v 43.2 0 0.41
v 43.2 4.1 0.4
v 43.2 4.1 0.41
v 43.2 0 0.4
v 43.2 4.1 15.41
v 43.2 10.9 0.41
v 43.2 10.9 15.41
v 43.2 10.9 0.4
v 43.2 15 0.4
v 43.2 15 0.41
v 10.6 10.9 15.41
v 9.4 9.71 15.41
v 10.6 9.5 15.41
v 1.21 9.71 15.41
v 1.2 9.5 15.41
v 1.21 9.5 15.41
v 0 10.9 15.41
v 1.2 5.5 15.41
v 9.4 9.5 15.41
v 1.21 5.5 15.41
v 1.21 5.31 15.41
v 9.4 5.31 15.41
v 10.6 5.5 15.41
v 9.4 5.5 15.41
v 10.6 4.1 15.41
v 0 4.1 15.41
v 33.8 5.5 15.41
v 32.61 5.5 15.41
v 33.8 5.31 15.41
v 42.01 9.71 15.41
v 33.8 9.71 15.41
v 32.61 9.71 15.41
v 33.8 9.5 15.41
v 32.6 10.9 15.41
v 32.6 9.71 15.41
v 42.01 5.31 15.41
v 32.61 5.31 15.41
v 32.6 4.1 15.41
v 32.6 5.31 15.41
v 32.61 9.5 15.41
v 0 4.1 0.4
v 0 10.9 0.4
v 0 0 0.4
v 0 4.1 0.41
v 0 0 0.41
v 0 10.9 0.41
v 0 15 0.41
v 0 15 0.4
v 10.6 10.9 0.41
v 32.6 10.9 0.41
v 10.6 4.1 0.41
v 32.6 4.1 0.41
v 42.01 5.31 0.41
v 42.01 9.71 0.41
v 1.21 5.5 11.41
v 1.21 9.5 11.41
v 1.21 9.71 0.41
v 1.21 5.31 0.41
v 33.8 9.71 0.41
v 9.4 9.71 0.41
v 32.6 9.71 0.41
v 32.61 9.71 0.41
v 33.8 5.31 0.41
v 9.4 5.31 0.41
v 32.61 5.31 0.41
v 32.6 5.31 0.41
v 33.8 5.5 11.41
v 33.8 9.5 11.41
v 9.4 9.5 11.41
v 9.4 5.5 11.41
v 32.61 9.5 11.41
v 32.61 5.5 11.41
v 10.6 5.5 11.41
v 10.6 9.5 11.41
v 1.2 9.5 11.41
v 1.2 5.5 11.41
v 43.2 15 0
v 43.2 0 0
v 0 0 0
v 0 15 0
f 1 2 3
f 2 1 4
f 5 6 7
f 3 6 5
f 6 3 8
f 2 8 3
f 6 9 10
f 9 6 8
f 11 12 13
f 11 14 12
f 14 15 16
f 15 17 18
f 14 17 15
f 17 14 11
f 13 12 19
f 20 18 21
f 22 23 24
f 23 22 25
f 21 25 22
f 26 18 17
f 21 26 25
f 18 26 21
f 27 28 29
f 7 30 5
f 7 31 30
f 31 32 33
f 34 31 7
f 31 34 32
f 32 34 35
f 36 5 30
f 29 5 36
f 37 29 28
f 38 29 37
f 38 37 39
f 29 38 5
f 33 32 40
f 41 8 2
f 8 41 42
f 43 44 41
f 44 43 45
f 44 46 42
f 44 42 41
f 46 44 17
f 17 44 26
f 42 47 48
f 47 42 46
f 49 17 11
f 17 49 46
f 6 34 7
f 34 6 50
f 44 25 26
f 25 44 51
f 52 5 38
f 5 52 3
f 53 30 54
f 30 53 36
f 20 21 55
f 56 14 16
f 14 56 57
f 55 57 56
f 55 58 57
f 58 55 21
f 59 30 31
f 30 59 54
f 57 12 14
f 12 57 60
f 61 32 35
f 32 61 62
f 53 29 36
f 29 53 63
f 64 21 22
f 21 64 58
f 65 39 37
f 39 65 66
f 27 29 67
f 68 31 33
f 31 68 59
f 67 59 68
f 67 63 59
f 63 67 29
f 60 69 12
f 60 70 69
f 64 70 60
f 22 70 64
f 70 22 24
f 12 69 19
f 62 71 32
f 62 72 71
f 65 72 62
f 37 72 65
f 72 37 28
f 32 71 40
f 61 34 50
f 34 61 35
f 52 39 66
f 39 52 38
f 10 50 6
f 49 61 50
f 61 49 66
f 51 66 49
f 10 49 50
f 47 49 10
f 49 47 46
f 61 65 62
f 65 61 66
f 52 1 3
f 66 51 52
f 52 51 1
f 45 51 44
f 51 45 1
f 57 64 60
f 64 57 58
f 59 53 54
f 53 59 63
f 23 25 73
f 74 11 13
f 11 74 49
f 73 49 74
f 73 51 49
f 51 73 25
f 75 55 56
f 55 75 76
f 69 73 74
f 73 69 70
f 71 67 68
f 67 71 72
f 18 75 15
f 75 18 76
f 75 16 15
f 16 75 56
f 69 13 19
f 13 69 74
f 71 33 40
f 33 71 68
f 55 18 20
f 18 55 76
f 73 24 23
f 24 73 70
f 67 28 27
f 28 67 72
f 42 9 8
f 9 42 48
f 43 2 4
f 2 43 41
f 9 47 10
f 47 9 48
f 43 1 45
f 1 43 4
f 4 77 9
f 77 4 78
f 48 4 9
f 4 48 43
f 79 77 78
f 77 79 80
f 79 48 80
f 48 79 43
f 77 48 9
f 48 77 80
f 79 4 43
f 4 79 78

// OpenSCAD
// file: ../../Base/PlacementOptions.scad
// Fischertechnik Box Foundation
// Placement Options

// Alignment
NoAlign = 0;
AlignLeft = 1;
AlignBottom = 2;
AlignCenter = 3;
AlignRight = 4;
AlignTop = 5;

// Element rotation degree steps
rotations = [0, -90, -180, -270];

// Rotation
NoRotation = 0;
Rotate0 = 0;
Rotate90 = 1;
Rotate180 = 2;
Rotate270 = 3;

// Docking (seen from above)
NoDock = -1;
DockLeft = 0;
DockTop = 1;
DockRight = 2;
DockCorner = 2;
DockBottom = 3;

// Web corners
LowerLeft = 0;
UpperLeft = 1;
UpperRight = 2;
LowerRight = 3;

// Web position relative to corner
LeftOfCorner = 0;
RightOfCorner = 1;
// file: ../../Base/Boxes.scad
// Fischertechnik Box Foundation
// Pre-designed Boxes

use <Constants.scad>

include <PlacementOptions.scad>

box190Width = 190;
box190Depth = 130;
box130Width = 130;
box130Depth = 95;

// Values are from an original ec3 box
topBottomDifference = 1.5;
outerHeight = 40;
baseThickness = 1.8;
innerHeight = outerHeight - baseThickness;
stackExcess = 5.7;
radius = 3.5;
wallThickness = 1.5;
tolerance = 0.2;

boxWallThickness = wallThickness;
boxBaseThickness = baseThickness;
boxWebWidth = 3.0;

// getBoxWallThickness()
// Gets the wall thickness of a Fischertechnik Box
function getBoxWallThickness() = boxWallThickness;

// getBoxUsageHeight(height = 38.2)
// Gets the usable height of a Fischertechnik box
// height = Outer height of the box from the bottom to the upper edge.
function getBoxUsageHeight(height = outerHeight) = height - baseThickness - stackExcess;

// getBoxInnerHeight()
// Gets the inner height of a Fischertechnik box, including the stack excess
function getBoxInnerHeight() = innerHeight;

// getBoxBaseThickness()
// Gets the thickness of the Fischertechnik box base.
function getBoxBaseThickness() = boxBaseThickness;

// getBoxWebWidth()
// Gets the width of a box web
function getBoxWebWidth() = boxWebWidth;

// getBox190Space()
// Gets the usable inner space of a Box 190 as an x/y-list
function getBox190Space() = [
    box190Width - 2*getBoxWallThickness() - topBottomDifference, 
    box190Depth - 2*getBoxWallThickness() - topBottomDifference ];

// RoundedCornerPlate(width, depth, height, radius)
// Creates a body plate with rounded corners for a box. Used
// also to create the complete box with the hull module.
// width = Width of the plate
// depth = depth of the plate 
// height = thickness of the plate
// radius = radius of the rounded corner
module RoundedCornerPlate(width, depth, height, radius) {
    translate([radius, radius])
    hull() {
        w = width-2*radius;
        d = depth-2*radius;
        cube([w, d, height]);
        cylinder(height, r=radius, $fn=getFragments());
        translate([w, 0])
            cylinder(height, r=radius, $fn=getFragments());
        translate([w, d])
            cylinder(height, r=radius, $fn=getFragments());
        translate([0, d])
            cylinder(height, r=radius, $fn=getFragments());
    }
}

// BoxBase(width, depth)
// Creates an empty stackable Fischertechnik compatible box
// width = Outer width of the box (190, 130, ...)
// depth = Outer depth of the box (130, 95, ...)

module BoxBase(width, depth, height=outerHeight) {    
    thinPlate = 0.01;

    innerHeight = height - baseThickness;    
    
    module Body(tolerance=tolerance) {
        hull() {
            // Bottom with tolerance to fit into the original boxes when stacked
            translate([-wallThickness+tolerance, -wallThickness+tolerance, -baseThickness])
                RoundedCornerPlate(width-topBottomDifference-2*tolerance, depth-topBottomDifference-2*tolerance, thinPlate, radius);
            
            // Top
            translate([-wallThickness-topBottomDifference/2, -wallThickness-topBottomDifference/2, innerHeight-thinPlate])
                RoundedCornerPlate(width, depth, thinPlate, radius);
         }
    }

    module Cutoff() {
        hull() {
            coWidth = width - 2*wallThickness;
            coDepth = depth - 2*wallThickness;
            
            // Bottom
            RoundedCornerPlate(coWidth-topBottomDifference, coDepth-topBottomDifference, thinPlate, radius);

            // Top
            translate([-topBottomDifference/2, -topBottomDifference/2, innerHeight+thinPlate]) 
                RoundedCornerPlate(coWidth, coDepth, thinPlate, radius);
        }
    }
    
    difference() {        
        Body();
        Cutoff();
        stackOffset = innerHeight - stackExcess;
        translate([0, 0, stackOffset + baseThickness])
            Body(tolerance=0);
    }
}

// Creates the Fischertechnik empty box 130x190 mm and places it at position 0,0
// 190x130 are the outer sizes, the inner space is slightly smaller. Use getBox190Space() to get the inner sizes.
// The box is positioned that the usable inner space is at the 0,0,0 position.

module Box190() {
    BoxBase(box190Width, box190Depth);
}

// Gets the usable inner space of a Box 130 as an x/y-list
function getBox130Space() = [
    box130Width - 2*getBoxWallThickness() - topBottomDifference, 
    box130Depth - 2*getBoxWallThickness() - topBottomDifference ];

// Creates the Fischertechnik empty box 95x130 mm and places it at position 0,0
// 190x130 are the outer sizes, the inner space is slightly smaller. Use getBox190Space() to get the inner sizes.
// The box is positioned that the usable inner space is at the 0,0,0 position.

module Box130() {
    BoxBase(box130Width, box130Depth);
}

// Creates a web at the specified box walls
// corner 0 = LowerLeft, 1 = UpperLeft, 2 = UpperRight, 3 = LowerRight
// side 0 = LeftOfCorner, 1 = RightOfCorner
// distance = Distance in mm from the corner
// boxSpace = inner width and depth of the box (default: Box 190)
// webWidth = length of the web (default is 3 mms)
// webThickness = thickness of the web (default is 1 mm)
// height = Height of the web (standard is getBoxUsageHeight())

module BoxWeb(corner, side, distance, boxSpace=getBox190Space(), webWidth=getBoxWebWidth(), webThickness=1.0, height=getBoxUsageHeight()) {
    sink = getBoxWallThickness()/2;

    width = (corner % 2 == 0) ? 
            (side == LeftOfCorner ? webWidth : webThickness) :
            (side == LeftOfCorner ? webThickness : webWidth);

    depth = (corner % 2 == 0) ? 
            (side == RightOfCorner ? webWidth : webThickness) :
            (side == RightOfCorner ? webThickness : webWidth);
    
    xDiff = corner == LowerLeft ? 
                (side == LeftOfCorner ? -sink : distance) :
            (corner == UpperLeft ?                
                (side == LeftOfCorner ? distance : -sink) :
            (corner == UpperRight ?
                (side == LeftOfCorner ? boxSpace.x-webWidth+sink : boxSpace.x-distance-webThickness) :
                (side == LeftOfCorner ? boxSpace.x-distance-webThickness: boxSpace.x-webWidth+sink)));

    yDiff = corner == LowerLeft ? 
                (side == RightOfCorner ? -sink : distance) :
            (corner == UpperLeft ?
                (side == RightOfCorner ? boxSpace.y-distance-webThickness : boxSpace.y-webWidth+sink) :
            (corner == UpperRight ?
                (side == RightOfCorner ? boxSpace.y-webWidth+sink : boxSpace.y-distance-webThickness) :
                (side == RightOfCorner ? distance : -sink)));
    
    translate([xDiff, yDiff, -getExcess()])
        cube([width, depth, height + 2*getExcess()]);
}
// file: ../../Base/Rotation.scad
// Fischertechnik Box Foundation
// Geometry Helpers Rotation

include <PlacementOptions.scad>

// getRotatedSpace(space, rotation=NoRotation)
// Rotates the space dependent on the specified rotation

function getRotatedSpace(space, rotation=NoRotation) = [
    (rotation == Rotate90 || rotation == Rotate270) ? space.y : space.x,
    (rotation == Rotate90 || rotation == Rotate270) ? space.x : space.y
];

// Rotates the given space around the fixed left lower corner
// space = the space the children needs as width/depth list [width,depth]
// rotation = 0 Rotate0 degrees, 1 Rotate90 degrees, 2 Rotate180 degrees, 3 Rotate270 degrees (equivalent to -90)

module RotateFix(space, rotation=NoRotation) {
    dy = (rotation == Rotate0 || rotation == Rotate270) ? 0 :
        (rotation == Rotate90) ? space.x :
        space.y;
    dx = (rotation < Rotate180) ? 0 :
        (rotation == Rotate180) ? space.x :
        space.y;
    
    translate([dx, dy, 0])
        rotate([0, 0, rotations[rotation]])
            children();
}
// file: ../../Base/Alignment.scad
// Fischertechnik Box Foundation
// Geometry Helpers Alignment

include <PlacementOptions.scad>

// getAlignedX(elementWidth, spaceWidth, align=AlignRight, offset=0)
// Gets the aligned X offset of an element with the given
// width in the given space.
// elementWidth = The width of the element to positon
// spaceWidth = The space where the element should be aligned
// align = 0 AlignLeft, 1 AlignCenter, 2 AlignRight
// offset = an optional offset from the aligned position. When
// aligned left or centered, then positive values are in X direction.
// When aligned right then positive values are in negative X direction.

function getAlignedX(elementWidth, spaceWidth, align=AlignRight, offset=0) =
    (align == AlignLeft) ?
        offset :
        ((align == AlignCenter) ?
        (spaceWidth - elementWidth)/2 + offset :
        spaceWidth - offset - elementWidth);

// getAlignedY(elementDepth, spaceDepth, align=AlignTop, offset=0)
// Gets the aligned Y offset of an element with the given
// depth in the given space.
// elementDepth = The depth of the element to positon
// spaceDepth = The space where the element should be aligned
// align = 0 AlignBottom, 1 AlignCenter, 2 AlignTop
// offset = an optional offset from the aligned position. When
// aligned bottom or centered, then positive values are in Y direction.
// When aligned top then positive values are in negative Y direction.

function getAlignedY(elementDepth, spaceDepth, align=AlignTop, offset=0) =
    (align == AlignBottom) ?
        offset :
        ((align == AlignCenter) ?
        (spaceDepth - elementDepth)/2 + offset :
        spaceDepth - offset - elementDepth);
// file: ../../Elements/FrameAxis40.scad
// Fischertechnik Box Library
// Frame for single 40 mm Axis (with Z28)
// 31064

use <../ModelBase/Complex.scad>

length = 40;

// getFrameAxis40Space()
// Gets the width (.x) and depth (.y) of the axis frame.

function getFrameAxis40Space() = getFrameAxisSpace(length);

// FrameAxis40()
// Axis holder for a single 50 mm axis.

module FrameAxis40() {
    FrameAxis(length);
}

// Test
color("lightgray")
FrameAxis40();
// file: ../../Base/Placement.scad
// Fischertechnik Box Foundation
// Geometry Helpers Placement

use <Constants.scad>
use <Alignment.scad>
use <Rotation.scad>
use <Boxes.scad>

include <PlacementOptions.scad>

// Place(x=0, y=0, elementSpace=[0,0], alignX=AlignLeft, alignY=AlignBottom, rotation=Rotate0, boxSpace=getBox190Space())
// Places the child at the specified position
// y = Y-Position. This is a relative position when an X aligment is specified.
// x = X-Position. This is a relative position when an Y aligment is specified.
// elementSpace = space of the element to be placed [x,y]
// alignX = -1=NoAlign, 0 AlignLeft, 1 AlignCenter, 3 AlignRight (elementSpace and boxSpace required!)
// alignY = -1=NoAlign, 2 AlignBottom, 1 AlignCenter, 4 AlignTop (elementSpace and boxSpace required!)
// rotation = 0 Rotate0 0 degrees, 1 Rotate90 90 degrees, 
// 2 Rotate180 180 degrees, 3 Rotate270 270 degrees (equivalent to -90)
// boxSpace = Inner space of the box where the placement occurs [x,y] - default is Box 190x130 inner space

module Place(x=0, y=0, elementSpace=[0,0], 
  alignX=AlignLeft, alignY=AlignBottom, 
  rotation=NoRotation, boxSpace=getBox190Space()) {

    module Position(x, y, space, rotation=Rotate0) {
        translate([x, y, 0])
            RotateFix(space, rotation)
                children();
    }

    space = getRotatedSpace(elementSpace, rotation);
    alignedX = getAlignedX(space.x, boxSpace.x, alignX, x);
    alignedY = getAlignedY(space.y, boxSpace.y, alignY, y);
    Position(alignedX, alignedY, elementSpace, rotation)
        children();
}

// Center(space=getBox130Space(), elementSpace=[0,0])
// space = Space where the children is centered. For cylinder use centered=true and no elementSpace.
// elementSpace = space of the element to be centered [x,y]

module Center(space=getBox190Space(), elementSpace=[0,0]) {
    Place(elementSpace=elementSpace, boxSpace=space, alignX=AlignCenter, alignY=AlignCenter)
        children();
}

// CenterHorizontal(width=0, y=0, offset=0, space=getBox130Space())
// width = Width of the element to be placed.
// y = Y position of the element
// offset = Offset from the center position (negative will be left of the center)
// space = Space where the element is placed

module CenterHorizontal(width=0, y=0, offset=0, space=getBox190Space()) {
    Place(x=offset, y=y, elementSpace=[width, 0], boxSpace=space, alignX=AlignCenter)
        children(0);
}

// CenterVertical(depth=0, x=0, offset=0, space=getBox130Space())
// depth = Depth of the element to be placed.
// x = X position of the element
// offset = Offset from the center position (negative will be down of the center)
// space = Space where the element is placed

module CenterVertical(depth=0, x=0, offset=0, space=getBox190Space()) {
    Place(x=x, y=offset, elementSpace=[0, depth], boxSpace=space, alignY=AlignCenter)
        children(0);
}

// getIsVertical(align)
// True if the specified alignment needs a vertical orientation for a divider (AlignRight, AlignLeft)

function getIsVertical(align) = (align == AlignRight || align == AlignLeft);

// getIsHorizontal(align)
// True if the specified alignment needs a horizontal orientation for a divider (AlignTop, AlignBottom)

function getIsHorizontal(align) = (align == AlignTop || align == AlignBottom);
// file: ../../Elements/AxisClip10.scad
// Fischertechnik Box Library
// Axis for clip 10
// 31023

use <../ModelBase/Simple.scad>
use <../Base/Constants.scad>

/* [Element Parameters] */
height = 23;
clipHeight = 10;

/* [Hidden] */
width = 12;
depth = 12;
upperDiameter = 3.6;

// getAxisClip10Space()
// Gets the space of a n axis for a clip 10 with spring ring (mot2)

function getAxisClip10Space() = [width, depth, height];

// AxisClip10(height, clipHeight)
// Axis for clip 10 with spring ring (mot2)
// height = Height of the complete axis (standard is 23, in mot3 its only 12)
// clipHeight = Height of the part for the clip (standard is 10, in mot3 its only 7)

module AxisClip10(height=height, clipHeight=clipHeight) {
    LeveledAxisWithSpace(height, height-clipHeight, getAxisClip10Space(), diameter=upperDiameter);
}

// Test
color("lightgray")
AxisClip10(height, clipHeight);
// file: ../../Base/Constants.scad
// Fischertechnik Box Foundation
// Constants

// Constant values necessary for multiple elements

// Base constants
dividerThickness = 1.2;
excess = 0.01;
fragments = 90;
tolerance = 0.8;

// Gets the thickness of a divider 
function getDividerThickness() = dividerThickness;

// Gets the excess that is used to merge walls into each other
function getExcess() = excess;

// Gets amount of fragments of a cylinder
function getFragments() = fragments;

// Gets the inner tolerance of a frame to each side
function getTolerance() = tolerance;


// Fischertechnik specific constants
axisDiameter = 4;
axisBottomDiameter = axisDiameter + 1;
axisTolerance = 0.2;

// Gets axis diameter of Fischertechnik axis
function getAxisDiameter() = axisDiameter;

// Gets axis diameter tolerance (subtracted for element axis)
function getAxisTolerance() = axisTolerance;

// Gets the axis diameter for standing axis
function getStandAxisDiameter() = getAxisDiameter() - getAxisTolerance();

// Gets axis bottom diameter for thicker part at the bottom
function getAxisBottomDiameter() = axisBottomDiameter;

standardEdgeDistance = 2.5;
standardWebDistance = 11.5;
standardCornerLength = 15;

// gets the standard distance to the wall of the box for dockable frames with webs
function getStandardEdgeDistance() = standardEdgeDistance;

// gets the standard distance of each web to the corner of the dockable frame
function getStandardWebDistance() = standardWebDistance;

// gets the standard length of the corner walls of a dockable frame
function getStandardCornerLength() = standardCornerLength;

tubeWallFactor = 0.8;

// gets the wall thickness of a tube.
function getTubeWallThickness() = tubeWallFactor * getDividerThickness();

smallPartsFrameHeight = 20;

// gets the frame height for docked small parts boxes.
function getSmallPartsFrameHeight() = smallPartsFrameHeight;

hubRingDiameter = 19.5;
hubRingLevelDiameter = 21;

// gets the diameter of a tube matching the inner ring of a wheel
function getHubRingDiameter() = hubRingDiameter;

// gets the diameter of a hub tube with a thicker diameter
function getHubRingLevelDiameter() = hubRingLevelDiameter;
// file: ../../Elements/FrameAxis40WithGearwheelZ28.scad
// Fischertechnik Box Library
// Frame for 40 mm Axis with gear wheel 28
// 31064

use <../Base/Placement.scad>
use <../ModelBase/Simple.scad>
use <FrameAxis40.scad>

/* [Hidden] */
depth = 15;

// getFrameAxis40WithGearwheelZ28Space()
// Gets the width (.x) and depth (.y) of the axis frame.

function getFrameAxis40WithGearwheelZ28Space() = 
[
    getFrameAxis40Space().x,
    depth
];

// FrameAxis40WithGearwheelZ28()
// Axis holder for a 40 mm axis with gear wheel Z28.

module FrameAxis40WithGearwheelZ28() {
    Space(getFrameAxis40WithGearwheelZ28Space());
    CenterVertical(depth=getFrameAxis40Space().y, space=getFrameAxis40WithGearwheelZ28Space())
        FrameAxis40();
}

// Test
color("lightgray")
FrameAxis40WithGearwheelZ28();
// file: ../TestPrint.scad
// 3D Print Test Base

use <../Base/Constants.scad>

use <../Elements/AxisClip10.scad>

module TestPrint(elementSpace) {
    cube([elementSpace.x, elementSpace.y, 0.4]);
    translate([0,0,0.4+getExcess()]) {
        children();
    }
}

TestPrint(getAxisClip10Space())
    AxisClip10();
// main file
// 3D Print Test
// FrameAxis40WithGearwheelZ28

use <../TestPrint.scad>
use <../../Elements/FrameAxis40WithGearwheelZ28.scad>

TestPrint(getFrameAxis40WithGearwheelZ28Space())
    FrameAxis40WithGearwheelZ28();
